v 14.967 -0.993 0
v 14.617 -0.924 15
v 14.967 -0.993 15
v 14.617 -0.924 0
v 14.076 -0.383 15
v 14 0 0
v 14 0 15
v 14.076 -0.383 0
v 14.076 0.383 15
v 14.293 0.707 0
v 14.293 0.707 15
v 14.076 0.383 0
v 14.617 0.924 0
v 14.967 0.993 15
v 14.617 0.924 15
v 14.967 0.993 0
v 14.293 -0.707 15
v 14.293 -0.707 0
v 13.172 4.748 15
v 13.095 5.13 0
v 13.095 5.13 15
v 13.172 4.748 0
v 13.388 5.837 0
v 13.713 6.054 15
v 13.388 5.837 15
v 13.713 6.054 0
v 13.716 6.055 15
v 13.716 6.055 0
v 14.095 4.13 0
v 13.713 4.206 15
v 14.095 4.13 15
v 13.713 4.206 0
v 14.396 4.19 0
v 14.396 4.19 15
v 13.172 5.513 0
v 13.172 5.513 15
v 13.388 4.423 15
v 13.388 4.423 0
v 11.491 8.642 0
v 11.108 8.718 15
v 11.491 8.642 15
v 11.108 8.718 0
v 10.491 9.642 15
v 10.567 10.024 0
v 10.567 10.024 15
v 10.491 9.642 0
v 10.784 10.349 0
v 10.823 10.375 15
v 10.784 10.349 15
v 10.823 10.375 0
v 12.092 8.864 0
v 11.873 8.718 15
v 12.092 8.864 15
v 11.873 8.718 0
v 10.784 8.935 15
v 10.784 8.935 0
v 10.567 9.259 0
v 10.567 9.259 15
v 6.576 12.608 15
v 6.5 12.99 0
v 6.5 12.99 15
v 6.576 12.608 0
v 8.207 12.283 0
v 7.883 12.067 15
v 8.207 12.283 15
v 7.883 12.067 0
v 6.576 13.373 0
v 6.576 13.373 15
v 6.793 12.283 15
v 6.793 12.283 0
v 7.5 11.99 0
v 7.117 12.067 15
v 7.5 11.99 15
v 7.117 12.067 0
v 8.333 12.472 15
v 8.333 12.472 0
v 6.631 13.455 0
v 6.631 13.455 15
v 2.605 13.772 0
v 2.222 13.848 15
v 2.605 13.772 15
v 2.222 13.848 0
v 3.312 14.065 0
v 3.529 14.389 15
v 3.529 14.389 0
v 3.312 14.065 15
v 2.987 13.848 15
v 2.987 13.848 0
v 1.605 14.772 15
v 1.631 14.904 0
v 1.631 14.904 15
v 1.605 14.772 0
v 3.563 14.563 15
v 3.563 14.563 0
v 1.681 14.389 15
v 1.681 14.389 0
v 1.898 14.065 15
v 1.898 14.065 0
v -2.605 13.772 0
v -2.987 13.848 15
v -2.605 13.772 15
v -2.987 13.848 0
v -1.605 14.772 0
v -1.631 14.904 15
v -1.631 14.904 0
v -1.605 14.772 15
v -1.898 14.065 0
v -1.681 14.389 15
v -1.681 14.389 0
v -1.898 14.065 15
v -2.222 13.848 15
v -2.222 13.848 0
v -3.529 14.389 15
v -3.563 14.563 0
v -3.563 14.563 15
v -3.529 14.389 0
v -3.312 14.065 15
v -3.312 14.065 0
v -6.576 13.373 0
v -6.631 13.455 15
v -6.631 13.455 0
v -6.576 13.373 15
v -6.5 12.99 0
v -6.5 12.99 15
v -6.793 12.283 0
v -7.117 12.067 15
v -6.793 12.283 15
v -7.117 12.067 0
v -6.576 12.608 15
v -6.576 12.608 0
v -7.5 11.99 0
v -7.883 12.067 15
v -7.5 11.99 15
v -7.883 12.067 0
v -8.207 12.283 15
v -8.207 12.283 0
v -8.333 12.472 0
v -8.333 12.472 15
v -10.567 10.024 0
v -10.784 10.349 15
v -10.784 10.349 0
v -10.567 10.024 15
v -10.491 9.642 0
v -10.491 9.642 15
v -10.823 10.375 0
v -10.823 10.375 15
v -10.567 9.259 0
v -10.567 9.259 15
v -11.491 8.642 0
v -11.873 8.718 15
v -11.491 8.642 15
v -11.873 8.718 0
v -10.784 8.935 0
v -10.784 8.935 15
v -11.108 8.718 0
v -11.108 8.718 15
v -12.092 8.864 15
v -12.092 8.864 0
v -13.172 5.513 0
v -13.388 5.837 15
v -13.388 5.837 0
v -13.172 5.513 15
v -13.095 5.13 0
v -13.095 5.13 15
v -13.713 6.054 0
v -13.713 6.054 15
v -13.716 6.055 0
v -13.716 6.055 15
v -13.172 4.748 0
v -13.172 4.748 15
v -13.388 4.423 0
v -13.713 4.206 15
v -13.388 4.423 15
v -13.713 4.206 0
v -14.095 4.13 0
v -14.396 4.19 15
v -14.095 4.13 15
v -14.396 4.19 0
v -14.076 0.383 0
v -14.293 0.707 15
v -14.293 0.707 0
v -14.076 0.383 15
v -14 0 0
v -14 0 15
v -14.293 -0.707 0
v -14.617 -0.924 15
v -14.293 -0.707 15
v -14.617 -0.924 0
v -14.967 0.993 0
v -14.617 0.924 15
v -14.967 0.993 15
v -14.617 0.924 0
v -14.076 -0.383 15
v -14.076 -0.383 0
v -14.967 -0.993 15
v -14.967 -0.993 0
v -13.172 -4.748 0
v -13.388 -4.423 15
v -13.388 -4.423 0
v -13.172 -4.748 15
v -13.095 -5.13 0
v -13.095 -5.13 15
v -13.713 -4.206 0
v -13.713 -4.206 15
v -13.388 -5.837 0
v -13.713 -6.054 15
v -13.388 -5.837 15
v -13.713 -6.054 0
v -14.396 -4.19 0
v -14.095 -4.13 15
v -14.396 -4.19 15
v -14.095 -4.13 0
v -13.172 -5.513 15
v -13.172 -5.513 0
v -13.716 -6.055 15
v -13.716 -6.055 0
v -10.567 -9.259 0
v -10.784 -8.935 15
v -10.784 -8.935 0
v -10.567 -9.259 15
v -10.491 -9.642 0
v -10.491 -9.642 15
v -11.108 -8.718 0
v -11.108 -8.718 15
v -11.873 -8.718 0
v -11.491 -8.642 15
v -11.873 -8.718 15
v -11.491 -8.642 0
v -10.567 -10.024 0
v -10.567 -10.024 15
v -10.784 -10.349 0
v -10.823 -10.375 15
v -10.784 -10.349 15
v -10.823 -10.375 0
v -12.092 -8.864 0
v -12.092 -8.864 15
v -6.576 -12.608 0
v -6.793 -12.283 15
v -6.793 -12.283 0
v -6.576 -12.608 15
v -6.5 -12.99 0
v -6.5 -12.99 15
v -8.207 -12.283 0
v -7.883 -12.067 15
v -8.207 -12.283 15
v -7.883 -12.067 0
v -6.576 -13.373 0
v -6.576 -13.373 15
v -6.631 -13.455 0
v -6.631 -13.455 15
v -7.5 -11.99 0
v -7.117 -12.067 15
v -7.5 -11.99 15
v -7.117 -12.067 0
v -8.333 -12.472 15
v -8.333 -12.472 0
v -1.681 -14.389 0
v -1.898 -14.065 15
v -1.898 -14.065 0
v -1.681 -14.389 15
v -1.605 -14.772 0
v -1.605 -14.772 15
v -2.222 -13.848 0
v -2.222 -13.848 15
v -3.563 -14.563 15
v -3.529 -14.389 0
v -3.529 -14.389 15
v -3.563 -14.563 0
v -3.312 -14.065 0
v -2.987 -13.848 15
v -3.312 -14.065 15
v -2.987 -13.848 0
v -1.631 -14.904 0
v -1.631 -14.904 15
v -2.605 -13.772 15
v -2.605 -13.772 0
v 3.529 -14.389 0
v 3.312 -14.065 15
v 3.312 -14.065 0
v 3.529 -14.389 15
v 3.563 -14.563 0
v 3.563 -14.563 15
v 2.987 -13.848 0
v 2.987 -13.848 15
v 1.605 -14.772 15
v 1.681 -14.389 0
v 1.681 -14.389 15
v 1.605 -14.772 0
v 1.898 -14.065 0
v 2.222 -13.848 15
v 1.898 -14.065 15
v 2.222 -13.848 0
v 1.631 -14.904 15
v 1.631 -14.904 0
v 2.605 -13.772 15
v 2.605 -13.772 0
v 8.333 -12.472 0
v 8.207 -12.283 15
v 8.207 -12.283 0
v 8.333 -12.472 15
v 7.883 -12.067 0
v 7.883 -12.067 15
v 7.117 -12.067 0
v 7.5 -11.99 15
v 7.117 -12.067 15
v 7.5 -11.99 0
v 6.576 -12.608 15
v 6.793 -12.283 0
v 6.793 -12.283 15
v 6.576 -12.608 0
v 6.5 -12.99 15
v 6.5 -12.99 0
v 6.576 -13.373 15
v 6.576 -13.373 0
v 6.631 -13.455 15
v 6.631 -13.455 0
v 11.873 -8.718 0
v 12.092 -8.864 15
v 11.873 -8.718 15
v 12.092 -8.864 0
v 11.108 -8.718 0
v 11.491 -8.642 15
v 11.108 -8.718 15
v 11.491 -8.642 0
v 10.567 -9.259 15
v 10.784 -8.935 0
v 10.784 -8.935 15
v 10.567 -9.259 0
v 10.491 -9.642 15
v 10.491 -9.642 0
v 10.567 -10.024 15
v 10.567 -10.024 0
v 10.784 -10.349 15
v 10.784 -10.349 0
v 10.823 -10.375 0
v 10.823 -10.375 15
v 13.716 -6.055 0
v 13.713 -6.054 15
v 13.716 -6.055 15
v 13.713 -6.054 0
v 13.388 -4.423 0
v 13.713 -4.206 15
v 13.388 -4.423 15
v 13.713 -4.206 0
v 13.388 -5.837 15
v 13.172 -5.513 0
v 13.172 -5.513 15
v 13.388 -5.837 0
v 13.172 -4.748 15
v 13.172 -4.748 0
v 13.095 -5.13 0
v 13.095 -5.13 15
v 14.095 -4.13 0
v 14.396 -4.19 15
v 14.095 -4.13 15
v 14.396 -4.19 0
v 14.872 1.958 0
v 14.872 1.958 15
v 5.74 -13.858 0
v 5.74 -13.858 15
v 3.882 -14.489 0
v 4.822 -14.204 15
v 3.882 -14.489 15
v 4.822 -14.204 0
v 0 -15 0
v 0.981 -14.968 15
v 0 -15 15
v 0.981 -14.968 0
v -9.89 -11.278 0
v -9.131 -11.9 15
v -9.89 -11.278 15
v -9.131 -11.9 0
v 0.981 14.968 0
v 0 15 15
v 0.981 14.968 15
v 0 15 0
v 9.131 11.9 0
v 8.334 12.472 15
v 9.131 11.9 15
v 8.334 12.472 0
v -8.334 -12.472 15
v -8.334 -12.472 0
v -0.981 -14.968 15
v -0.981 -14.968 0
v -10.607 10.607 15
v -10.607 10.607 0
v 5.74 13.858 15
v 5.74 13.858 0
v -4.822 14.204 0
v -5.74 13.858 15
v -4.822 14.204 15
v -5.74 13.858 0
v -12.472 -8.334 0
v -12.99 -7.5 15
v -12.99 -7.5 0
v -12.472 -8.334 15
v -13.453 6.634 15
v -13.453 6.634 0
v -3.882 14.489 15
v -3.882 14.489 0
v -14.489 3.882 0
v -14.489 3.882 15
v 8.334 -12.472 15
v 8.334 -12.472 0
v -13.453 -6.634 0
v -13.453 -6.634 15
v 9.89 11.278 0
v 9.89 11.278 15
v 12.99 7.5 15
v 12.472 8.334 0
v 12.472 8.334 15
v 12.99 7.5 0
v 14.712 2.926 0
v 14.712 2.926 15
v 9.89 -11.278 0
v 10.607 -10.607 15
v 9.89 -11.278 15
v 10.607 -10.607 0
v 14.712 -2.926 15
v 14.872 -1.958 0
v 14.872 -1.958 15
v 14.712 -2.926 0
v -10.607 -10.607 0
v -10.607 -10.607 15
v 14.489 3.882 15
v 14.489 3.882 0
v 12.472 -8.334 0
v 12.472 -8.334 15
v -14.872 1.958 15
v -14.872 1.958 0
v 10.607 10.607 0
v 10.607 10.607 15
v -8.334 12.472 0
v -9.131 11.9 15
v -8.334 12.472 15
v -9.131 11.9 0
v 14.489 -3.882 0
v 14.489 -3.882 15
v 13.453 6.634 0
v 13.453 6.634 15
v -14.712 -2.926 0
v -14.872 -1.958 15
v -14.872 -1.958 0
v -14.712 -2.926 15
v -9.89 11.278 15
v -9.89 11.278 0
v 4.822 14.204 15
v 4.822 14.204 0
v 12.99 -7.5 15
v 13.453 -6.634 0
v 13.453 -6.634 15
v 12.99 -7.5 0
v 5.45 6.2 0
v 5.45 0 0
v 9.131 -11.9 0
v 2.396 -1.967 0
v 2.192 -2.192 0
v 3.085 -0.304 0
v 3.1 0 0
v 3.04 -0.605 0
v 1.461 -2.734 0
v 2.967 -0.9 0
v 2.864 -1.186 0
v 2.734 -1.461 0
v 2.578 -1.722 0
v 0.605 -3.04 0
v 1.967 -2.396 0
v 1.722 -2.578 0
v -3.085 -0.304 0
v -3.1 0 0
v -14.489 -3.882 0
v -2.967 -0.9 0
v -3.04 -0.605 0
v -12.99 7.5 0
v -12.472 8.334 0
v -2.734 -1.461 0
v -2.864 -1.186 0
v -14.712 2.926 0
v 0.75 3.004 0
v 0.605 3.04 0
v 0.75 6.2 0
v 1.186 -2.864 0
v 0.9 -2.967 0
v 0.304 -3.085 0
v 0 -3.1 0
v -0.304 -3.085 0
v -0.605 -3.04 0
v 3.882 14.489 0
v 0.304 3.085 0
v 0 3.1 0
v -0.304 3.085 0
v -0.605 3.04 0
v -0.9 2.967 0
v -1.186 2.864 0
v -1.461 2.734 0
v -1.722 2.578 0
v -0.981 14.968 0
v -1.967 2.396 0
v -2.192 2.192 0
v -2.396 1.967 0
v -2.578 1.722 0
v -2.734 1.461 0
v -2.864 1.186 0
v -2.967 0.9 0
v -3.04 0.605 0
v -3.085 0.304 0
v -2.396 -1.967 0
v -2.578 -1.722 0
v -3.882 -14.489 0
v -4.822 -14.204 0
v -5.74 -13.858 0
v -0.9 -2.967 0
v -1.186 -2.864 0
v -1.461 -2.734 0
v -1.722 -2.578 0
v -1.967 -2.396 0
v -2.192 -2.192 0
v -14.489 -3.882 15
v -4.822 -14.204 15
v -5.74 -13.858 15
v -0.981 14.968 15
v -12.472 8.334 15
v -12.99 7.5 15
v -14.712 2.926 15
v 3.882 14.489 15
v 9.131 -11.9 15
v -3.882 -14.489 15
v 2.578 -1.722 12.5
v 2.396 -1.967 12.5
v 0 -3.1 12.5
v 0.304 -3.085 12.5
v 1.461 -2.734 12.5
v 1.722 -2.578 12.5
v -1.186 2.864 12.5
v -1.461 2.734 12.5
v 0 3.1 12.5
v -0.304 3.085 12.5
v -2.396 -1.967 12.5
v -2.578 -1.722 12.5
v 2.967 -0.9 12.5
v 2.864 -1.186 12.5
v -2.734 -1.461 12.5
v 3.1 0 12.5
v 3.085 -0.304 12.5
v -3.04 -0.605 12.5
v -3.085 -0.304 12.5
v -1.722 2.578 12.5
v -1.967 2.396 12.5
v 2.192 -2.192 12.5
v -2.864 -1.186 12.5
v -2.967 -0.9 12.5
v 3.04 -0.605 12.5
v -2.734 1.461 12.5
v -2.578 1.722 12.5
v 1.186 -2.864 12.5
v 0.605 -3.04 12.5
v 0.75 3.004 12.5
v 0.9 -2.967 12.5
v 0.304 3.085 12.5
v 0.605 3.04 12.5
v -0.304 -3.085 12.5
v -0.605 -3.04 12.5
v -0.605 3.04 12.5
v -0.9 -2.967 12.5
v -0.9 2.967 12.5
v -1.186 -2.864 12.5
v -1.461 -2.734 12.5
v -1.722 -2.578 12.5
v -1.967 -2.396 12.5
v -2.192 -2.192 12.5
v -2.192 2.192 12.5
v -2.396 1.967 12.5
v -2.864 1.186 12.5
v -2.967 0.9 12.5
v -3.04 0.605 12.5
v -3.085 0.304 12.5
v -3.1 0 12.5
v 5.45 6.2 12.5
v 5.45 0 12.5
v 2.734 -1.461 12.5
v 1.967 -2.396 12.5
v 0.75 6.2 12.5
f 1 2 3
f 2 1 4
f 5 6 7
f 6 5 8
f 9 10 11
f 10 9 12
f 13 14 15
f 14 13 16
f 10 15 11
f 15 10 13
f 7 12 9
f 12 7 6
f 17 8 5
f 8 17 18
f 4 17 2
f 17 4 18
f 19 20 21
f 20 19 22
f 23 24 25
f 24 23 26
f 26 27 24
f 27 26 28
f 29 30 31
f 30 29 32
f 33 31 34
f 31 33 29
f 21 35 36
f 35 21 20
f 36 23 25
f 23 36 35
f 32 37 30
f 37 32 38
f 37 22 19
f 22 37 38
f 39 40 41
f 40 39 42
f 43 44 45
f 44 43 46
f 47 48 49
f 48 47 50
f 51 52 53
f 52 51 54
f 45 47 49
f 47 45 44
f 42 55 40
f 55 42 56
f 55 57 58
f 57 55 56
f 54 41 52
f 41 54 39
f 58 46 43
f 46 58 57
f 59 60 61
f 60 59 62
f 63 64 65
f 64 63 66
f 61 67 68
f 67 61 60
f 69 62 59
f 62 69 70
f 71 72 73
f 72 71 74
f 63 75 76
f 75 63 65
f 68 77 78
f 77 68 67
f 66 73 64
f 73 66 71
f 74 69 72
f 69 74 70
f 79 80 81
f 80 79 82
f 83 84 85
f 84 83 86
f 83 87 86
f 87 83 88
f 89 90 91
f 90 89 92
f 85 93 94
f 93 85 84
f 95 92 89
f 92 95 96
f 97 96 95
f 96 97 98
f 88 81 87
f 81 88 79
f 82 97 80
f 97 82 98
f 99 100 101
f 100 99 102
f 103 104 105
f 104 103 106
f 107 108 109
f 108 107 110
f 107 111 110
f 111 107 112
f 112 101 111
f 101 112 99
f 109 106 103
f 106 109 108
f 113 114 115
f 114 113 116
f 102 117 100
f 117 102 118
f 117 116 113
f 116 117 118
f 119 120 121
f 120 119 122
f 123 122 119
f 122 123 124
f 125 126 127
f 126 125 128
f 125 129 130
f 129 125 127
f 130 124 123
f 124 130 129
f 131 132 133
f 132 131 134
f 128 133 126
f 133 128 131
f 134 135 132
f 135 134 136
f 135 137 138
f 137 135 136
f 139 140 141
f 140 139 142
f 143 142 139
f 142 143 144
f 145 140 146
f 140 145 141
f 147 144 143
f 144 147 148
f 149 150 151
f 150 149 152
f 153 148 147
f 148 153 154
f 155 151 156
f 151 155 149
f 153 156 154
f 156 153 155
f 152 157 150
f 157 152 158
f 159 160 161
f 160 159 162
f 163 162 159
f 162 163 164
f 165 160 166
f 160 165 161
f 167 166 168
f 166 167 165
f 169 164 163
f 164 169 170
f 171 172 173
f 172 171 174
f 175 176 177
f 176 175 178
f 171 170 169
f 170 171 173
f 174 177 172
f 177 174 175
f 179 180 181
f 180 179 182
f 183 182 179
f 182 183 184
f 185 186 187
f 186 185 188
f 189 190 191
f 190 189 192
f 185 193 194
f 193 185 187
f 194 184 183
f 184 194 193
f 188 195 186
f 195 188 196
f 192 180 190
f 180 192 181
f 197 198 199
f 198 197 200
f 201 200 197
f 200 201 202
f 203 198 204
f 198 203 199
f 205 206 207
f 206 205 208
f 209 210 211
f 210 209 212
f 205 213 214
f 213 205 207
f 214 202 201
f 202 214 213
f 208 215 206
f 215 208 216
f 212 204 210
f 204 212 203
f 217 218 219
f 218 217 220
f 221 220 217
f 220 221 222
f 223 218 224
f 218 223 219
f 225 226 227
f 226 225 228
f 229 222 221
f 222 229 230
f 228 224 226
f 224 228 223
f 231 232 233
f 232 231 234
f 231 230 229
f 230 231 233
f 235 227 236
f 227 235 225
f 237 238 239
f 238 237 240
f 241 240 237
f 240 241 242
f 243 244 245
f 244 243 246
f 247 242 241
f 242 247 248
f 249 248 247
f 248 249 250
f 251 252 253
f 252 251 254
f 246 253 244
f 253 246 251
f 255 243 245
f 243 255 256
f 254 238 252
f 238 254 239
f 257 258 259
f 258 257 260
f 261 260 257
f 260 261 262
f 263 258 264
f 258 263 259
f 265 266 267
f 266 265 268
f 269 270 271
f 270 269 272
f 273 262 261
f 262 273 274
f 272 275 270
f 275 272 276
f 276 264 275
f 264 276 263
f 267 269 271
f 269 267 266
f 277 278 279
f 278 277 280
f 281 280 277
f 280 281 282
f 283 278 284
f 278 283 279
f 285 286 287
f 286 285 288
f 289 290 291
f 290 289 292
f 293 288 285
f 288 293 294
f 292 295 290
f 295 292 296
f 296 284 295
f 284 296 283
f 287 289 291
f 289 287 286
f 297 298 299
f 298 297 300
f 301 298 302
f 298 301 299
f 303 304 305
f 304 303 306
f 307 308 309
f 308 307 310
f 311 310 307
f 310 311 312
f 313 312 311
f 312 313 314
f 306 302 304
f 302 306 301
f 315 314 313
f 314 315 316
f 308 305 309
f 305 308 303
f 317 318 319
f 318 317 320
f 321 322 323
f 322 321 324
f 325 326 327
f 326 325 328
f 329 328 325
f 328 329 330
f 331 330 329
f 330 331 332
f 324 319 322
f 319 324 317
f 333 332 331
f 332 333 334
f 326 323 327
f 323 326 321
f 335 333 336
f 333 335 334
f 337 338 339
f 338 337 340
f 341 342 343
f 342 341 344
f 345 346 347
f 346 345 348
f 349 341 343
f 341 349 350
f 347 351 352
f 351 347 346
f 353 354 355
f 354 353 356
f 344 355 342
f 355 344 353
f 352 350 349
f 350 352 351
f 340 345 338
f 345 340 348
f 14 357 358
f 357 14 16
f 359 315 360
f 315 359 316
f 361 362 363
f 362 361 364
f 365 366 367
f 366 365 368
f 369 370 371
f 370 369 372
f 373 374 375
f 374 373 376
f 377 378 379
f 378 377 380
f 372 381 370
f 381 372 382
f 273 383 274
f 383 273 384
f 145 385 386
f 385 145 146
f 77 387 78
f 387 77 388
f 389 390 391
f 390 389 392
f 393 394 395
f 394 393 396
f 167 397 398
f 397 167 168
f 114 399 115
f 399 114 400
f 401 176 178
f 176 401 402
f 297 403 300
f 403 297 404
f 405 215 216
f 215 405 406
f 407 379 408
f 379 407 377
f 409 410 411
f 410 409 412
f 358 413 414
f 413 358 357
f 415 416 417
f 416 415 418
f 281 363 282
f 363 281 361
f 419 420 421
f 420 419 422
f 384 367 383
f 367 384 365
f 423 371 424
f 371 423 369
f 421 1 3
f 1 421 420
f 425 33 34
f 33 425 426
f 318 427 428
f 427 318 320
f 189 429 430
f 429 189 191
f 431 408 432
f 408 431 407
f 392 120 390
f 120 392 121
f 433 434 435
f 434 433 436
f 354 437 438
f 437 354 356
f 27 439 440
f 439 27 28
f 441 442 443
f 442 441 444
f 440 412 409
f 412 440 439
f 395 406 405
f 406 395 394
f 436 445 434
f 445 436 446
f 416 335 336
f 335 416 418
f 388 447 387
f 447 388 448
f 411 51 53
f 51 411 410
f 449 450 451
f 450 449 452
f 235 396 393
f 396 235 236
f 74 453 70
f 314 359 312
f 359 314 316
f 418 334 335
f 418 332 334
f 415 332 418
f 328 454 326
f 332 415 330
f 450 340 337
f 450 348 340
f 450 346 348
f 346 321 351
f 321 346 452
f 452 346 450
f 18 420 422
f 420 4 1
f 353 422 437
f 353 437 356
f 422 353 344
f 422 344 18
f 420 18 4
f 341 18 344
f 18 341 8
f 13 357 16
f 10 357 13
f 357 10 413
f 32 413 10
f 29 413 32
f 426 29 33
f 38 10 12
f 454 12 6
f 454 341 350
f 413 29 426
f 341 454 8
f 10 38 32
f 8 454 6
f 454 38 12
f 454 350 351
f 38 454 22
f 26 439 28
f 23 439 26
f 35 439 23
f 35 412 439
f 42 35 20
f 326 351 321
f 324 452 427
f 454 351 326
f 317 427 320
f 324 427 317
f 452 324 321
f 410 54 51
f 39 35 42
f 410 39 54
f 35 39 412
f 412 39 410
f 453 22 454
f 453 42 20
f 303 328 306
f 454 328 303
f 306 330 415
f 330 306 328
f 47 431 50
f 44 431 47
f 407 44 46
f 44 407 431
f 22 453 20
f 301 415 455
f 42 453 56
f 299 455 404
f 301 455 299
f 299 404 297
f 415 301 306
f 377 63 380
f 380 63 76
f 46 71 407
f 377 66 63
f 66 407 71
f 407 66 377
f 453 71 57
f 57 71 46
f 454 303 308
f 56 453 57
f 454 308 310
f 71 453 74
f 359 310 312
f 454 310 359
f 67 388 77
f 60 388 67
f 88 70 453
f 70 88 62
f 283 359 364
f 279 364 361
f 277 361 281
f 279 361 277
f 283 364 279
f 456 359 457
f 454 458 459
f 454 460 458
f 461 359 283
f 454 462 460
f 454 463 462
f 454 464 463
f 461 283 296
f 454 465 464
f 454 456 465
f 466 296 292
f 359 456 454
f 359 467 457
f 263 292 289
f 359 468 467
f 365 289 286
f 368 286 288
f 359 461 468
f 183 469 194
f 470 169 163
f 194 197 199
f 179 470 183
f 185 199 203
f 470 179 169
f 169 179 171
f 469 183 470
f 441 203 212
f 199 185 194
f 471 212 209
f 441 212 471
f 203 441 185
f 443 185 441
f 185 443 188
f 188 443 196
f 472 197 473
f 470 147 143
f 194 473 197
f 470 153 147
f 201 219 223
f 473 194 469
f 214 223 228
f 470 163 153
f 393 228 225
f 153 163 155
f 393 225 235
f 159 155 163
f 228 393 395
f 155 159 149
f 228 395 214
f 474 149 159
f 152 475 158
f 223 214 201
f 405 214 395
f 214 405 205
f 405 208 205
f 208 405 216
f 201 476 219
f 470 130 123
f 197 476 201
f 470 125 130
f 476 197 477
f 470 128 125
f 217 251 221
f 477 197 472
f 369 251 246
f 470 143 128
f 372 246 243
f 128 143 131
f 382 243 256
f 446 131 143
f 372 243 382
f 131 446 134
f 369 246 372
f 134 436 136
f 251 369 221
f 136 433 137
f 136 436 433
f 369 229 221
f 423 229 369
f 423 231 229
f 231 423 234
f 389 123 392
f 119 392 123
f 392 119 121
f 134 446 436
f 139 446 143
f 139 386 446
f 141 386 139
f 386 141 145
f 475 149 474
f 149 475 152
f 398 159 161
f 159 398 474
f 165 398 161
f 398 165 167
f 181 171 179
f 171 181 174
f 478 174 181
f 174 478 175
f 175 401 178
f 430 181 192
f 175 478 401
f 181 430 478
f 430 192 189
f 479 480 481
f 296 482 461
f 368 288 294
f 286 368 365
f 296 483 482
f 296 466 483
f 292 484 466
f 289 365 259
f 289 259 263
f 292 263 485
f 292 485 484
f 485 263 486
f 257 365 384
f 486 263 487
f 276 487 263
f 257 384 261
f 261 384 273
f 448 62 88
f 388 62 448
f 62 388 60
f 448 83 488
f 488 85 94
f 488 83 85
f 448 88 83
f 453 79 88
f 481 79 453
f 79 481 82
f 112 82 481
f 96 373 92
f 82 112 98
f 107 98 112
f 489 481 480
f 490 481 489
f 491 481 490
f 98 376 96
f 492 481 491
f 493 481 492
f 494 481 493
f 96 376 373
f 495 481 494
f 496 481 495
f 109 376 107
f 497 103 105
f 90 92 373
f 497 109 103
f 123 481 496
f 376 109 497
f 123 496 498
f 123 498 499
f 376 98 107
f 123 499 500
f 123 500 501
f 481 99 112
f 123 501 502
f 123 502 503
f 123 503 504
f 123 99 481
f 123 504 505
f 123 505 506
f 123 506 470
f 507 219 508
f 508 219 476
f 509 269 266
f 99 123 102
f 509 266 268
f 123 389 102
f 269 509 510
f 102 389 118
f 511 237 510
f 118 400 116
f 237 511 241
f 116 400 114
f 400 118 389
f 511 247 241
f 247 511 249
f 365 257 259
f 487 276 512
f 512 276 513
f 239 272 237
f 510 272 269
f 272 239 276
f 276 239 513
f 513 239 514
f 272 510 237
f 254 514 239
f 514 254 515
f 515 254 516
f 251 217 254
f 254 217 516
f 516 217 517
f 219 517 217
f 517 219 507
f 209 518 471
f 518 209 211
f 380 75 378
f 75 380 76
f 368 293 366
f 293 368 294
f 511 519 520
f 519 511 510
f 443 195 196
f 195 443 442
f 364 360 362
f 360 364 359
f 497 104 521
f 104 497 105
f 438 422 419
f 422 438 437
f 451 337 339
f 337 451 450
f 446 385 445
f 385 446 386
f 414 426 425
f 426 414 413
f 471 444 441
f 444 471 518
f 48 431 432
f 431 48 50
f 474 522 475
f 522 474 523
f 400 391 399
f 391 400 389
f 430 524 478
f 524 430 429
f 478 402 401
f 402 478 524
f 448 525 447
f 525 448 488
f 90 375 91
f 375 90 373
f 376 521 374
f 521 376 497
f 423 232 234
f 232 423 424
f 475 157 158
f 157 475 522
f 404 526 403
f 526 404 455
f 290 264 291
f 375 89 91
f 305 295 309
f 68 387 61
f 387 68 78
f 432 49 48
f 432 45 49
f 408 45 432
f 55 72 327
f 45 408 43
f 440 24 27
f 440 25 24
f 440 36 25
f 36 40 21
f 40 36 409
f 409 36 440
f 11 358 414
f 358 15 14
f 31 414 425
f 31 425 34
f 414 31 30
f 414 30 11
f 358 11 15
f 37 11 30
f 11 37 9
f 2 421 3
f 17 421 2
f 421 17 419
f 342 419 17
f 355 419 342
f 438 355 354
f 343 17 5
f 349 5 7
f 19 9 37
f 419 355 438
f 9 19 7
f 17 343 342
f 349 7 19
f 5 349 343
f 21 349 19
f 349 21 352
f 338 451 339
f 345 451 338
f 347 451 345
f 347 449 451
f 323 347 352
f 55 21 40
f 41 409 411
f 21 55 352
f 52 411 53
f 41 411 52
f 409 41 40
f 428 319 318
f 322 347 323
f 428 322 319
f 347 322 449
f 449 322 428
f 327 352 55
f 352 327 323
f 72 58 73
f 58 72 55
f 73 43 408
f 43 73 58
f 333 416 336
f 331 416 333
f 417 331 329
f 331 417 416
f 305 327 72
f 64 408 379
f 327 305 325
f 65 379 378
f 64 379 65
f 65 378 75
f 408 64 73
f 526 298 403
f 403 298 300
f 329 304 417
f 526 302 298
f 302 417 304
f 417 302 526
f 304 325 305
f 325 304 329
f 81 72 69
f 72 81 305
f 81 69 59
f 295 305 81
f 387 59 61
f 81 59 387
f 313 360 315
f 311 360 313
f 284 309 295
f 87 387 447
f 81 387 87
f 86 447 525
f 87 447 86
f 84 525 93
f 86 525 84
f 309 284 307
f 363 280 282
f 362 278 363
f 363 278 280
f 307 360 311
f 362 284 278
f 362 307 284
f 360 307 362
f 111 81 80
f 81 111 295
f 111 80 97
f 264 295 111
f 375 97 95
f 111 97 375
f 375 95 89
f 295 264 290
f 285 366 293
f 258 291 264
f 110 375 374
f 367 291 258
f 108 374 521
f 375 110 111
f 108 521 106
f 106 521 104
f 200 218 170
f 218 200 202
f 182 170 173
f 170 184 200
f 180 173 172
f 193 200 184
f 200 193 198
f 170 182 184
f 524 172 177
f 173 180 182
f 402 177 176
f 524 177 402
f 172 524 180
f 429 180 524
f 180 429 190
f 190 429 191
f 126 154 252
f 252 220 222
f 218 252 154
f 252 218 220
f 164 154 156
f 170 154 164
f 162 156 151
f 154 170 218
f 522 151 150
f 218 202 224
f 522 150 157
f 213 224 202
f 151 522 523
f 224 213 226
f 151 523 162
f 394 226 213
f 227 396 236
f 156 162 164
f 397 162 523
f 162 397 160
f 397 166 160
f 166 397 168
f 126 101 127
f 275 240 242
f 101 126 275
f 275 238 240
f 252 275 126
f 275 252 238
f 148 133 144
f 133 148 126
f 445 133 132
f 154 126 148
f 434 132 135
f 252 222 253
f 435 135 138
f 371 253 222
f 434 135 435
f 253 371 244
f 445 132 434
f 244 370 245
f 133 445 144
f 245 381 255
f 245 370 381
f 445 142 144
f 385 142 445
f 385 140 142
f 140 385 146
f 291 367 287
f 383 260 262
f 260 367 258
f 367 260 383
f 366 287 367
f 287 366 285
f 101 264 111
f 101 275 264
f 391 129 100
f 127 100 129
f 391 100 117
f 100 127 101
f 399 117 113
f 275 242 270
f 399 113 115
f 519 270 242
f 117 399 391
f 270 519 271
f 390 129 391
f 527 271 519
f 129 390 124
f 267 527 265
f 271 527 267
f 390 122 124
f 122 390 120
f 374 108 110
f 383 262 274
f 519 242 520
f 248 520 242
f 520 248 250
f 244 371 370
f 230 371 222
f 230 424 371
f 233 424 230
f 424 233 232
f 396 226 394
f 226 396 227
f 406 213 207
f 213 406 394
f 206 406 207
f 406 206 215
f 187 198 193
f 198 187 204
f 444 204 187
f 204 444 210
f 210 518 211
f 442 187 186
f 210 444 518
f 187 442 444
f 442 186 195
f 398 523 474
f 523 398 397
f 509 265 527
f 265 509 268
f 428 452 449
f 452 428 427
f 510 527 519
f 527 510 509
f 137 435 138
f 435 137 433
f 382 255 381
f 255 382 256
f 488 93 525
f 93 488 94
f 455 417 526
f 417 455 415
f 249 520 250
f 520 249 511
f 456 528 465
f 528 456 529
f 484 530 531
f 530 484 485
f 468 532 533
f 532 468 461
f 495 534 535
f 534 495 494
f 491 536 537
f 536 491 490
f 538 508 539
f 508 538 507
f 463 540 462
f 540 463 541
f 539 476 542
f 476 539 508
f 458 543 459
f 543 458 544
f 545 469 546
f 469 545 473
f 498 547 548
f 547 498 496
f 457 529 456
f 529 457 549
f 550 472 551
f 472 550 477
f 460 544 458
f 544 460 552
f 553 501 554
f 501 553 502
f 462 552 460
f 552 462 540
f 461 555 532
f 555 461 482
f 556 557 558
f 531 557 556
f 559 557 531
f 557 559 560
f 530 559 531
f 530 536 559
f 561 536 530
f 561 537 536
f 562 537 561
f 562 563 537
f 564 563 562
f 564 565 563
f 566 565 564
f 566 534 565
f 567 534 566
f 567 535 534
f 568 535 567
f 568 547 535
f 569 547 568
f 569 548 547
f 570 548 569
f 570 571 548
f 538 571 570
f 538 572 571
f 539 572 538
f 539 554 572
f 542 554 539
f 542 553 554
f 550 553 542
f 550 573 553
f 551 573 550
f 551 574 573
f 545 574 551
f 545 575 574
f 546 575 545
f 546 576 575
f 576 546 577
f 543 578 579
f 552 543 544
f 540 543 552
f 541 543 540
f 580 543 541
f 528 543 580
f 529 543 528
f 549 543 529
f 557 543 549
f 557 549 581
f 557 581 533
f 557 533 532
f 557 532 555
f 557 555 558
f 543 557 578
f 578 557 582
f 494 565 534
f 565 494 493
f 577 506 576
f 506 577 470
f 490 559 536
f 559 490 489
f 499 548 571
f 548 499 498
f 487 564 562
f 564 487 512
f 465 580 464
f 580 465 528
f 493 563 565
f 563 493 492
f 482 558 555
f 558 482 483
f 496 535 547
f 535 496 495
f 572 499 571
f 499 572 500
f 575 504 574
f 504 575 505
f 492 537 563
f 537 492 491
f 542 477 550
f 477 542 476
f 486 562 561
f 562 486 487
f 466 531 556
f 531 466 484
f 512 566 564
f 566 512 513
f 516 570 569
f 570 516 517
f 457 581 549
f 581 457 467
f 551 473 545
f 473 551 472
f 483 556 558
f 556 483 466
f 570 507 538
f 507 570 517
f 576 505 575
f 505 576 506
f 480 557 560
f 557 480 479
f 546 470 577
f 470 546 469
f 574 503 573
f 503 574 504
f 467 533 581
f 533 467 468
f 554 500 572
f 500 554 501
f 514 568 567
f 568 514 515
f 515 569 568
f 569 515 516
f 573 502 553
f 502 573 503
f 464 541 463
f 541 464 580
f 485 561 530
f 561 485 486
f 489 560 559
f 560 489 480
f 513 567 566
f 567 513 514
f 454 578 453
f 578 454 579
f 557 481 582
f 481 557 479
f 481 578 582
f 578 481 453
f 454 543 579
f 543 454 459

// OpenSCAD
// Replacement knob for hotplate stirrer (D-shaft)
// Print orientation: side facing hotplate down on bed (z = 0)

// ---------------- Parameters ----------------
knob_d          = 30;    // knob outer diameter
knob_h          = 15;    // knob height
shaft_d         = 6.2;   // D-shaft diameter
bore_depth      = 12;    // blind bore depth from bottom face
bore_flat       = 4.7;   // distance from flat to opposite side of D-bore
groove_count    = 18;    // number of grip grooves
groove_d        = 2;     // grip groove diameter (half-cylinder)
pointer_w       = 1.5;   // pointer groove width
pointer_d       = 1;     // pointer groove depth

eps             = 0.5;   // cutter overshoot past faces
$fn             = 96;    // curve resolution

// Derived
bore_r = shaft_d / 2;                    // D-bore radius
flat_x = bore_r - bore_flat / 2;         // flat offset from bore centre
pitch  = 360 / groove_count;             // groove angular pitch

// ---------------- Model ----------------
difference() {
    // Main body
    cylinder(d = knob_d, h = knob_h);

    // D-shaped blind bore, centred on origin, flat on +X side
    translate([0, 0, -eps])
        cylinder(r = bore_r, h = bore_depth + 2 * eps, $fn = 64);
    translate([flat_x, 0, -eps])
        cube([bore_flat, 2 * bore_r, bore_depth + 2 * eps]);

    // Grip grooves: vertical half-cylinders centred on outer surface
    for (i = [0 : groove_count - 1]) {
        a = i * pitch;
        translate([knob_d / 2 * cos(a), knob_d / 2 * sin(a), -eps])
            cylinder(d = groove_d, h = knob_h + 2 * eps, $fn = 16);
    }

    // Pointer groove: radial slot from centre to edge, on +X side
    translate([0, 0, -eps])
        linear_extrude(height = knob_h + 2 * eps)
            translate([-pointer_w / 2, 0, 0])
                cube([pointer_w, knob_d / 2 + 1, pointer_d]);
}
